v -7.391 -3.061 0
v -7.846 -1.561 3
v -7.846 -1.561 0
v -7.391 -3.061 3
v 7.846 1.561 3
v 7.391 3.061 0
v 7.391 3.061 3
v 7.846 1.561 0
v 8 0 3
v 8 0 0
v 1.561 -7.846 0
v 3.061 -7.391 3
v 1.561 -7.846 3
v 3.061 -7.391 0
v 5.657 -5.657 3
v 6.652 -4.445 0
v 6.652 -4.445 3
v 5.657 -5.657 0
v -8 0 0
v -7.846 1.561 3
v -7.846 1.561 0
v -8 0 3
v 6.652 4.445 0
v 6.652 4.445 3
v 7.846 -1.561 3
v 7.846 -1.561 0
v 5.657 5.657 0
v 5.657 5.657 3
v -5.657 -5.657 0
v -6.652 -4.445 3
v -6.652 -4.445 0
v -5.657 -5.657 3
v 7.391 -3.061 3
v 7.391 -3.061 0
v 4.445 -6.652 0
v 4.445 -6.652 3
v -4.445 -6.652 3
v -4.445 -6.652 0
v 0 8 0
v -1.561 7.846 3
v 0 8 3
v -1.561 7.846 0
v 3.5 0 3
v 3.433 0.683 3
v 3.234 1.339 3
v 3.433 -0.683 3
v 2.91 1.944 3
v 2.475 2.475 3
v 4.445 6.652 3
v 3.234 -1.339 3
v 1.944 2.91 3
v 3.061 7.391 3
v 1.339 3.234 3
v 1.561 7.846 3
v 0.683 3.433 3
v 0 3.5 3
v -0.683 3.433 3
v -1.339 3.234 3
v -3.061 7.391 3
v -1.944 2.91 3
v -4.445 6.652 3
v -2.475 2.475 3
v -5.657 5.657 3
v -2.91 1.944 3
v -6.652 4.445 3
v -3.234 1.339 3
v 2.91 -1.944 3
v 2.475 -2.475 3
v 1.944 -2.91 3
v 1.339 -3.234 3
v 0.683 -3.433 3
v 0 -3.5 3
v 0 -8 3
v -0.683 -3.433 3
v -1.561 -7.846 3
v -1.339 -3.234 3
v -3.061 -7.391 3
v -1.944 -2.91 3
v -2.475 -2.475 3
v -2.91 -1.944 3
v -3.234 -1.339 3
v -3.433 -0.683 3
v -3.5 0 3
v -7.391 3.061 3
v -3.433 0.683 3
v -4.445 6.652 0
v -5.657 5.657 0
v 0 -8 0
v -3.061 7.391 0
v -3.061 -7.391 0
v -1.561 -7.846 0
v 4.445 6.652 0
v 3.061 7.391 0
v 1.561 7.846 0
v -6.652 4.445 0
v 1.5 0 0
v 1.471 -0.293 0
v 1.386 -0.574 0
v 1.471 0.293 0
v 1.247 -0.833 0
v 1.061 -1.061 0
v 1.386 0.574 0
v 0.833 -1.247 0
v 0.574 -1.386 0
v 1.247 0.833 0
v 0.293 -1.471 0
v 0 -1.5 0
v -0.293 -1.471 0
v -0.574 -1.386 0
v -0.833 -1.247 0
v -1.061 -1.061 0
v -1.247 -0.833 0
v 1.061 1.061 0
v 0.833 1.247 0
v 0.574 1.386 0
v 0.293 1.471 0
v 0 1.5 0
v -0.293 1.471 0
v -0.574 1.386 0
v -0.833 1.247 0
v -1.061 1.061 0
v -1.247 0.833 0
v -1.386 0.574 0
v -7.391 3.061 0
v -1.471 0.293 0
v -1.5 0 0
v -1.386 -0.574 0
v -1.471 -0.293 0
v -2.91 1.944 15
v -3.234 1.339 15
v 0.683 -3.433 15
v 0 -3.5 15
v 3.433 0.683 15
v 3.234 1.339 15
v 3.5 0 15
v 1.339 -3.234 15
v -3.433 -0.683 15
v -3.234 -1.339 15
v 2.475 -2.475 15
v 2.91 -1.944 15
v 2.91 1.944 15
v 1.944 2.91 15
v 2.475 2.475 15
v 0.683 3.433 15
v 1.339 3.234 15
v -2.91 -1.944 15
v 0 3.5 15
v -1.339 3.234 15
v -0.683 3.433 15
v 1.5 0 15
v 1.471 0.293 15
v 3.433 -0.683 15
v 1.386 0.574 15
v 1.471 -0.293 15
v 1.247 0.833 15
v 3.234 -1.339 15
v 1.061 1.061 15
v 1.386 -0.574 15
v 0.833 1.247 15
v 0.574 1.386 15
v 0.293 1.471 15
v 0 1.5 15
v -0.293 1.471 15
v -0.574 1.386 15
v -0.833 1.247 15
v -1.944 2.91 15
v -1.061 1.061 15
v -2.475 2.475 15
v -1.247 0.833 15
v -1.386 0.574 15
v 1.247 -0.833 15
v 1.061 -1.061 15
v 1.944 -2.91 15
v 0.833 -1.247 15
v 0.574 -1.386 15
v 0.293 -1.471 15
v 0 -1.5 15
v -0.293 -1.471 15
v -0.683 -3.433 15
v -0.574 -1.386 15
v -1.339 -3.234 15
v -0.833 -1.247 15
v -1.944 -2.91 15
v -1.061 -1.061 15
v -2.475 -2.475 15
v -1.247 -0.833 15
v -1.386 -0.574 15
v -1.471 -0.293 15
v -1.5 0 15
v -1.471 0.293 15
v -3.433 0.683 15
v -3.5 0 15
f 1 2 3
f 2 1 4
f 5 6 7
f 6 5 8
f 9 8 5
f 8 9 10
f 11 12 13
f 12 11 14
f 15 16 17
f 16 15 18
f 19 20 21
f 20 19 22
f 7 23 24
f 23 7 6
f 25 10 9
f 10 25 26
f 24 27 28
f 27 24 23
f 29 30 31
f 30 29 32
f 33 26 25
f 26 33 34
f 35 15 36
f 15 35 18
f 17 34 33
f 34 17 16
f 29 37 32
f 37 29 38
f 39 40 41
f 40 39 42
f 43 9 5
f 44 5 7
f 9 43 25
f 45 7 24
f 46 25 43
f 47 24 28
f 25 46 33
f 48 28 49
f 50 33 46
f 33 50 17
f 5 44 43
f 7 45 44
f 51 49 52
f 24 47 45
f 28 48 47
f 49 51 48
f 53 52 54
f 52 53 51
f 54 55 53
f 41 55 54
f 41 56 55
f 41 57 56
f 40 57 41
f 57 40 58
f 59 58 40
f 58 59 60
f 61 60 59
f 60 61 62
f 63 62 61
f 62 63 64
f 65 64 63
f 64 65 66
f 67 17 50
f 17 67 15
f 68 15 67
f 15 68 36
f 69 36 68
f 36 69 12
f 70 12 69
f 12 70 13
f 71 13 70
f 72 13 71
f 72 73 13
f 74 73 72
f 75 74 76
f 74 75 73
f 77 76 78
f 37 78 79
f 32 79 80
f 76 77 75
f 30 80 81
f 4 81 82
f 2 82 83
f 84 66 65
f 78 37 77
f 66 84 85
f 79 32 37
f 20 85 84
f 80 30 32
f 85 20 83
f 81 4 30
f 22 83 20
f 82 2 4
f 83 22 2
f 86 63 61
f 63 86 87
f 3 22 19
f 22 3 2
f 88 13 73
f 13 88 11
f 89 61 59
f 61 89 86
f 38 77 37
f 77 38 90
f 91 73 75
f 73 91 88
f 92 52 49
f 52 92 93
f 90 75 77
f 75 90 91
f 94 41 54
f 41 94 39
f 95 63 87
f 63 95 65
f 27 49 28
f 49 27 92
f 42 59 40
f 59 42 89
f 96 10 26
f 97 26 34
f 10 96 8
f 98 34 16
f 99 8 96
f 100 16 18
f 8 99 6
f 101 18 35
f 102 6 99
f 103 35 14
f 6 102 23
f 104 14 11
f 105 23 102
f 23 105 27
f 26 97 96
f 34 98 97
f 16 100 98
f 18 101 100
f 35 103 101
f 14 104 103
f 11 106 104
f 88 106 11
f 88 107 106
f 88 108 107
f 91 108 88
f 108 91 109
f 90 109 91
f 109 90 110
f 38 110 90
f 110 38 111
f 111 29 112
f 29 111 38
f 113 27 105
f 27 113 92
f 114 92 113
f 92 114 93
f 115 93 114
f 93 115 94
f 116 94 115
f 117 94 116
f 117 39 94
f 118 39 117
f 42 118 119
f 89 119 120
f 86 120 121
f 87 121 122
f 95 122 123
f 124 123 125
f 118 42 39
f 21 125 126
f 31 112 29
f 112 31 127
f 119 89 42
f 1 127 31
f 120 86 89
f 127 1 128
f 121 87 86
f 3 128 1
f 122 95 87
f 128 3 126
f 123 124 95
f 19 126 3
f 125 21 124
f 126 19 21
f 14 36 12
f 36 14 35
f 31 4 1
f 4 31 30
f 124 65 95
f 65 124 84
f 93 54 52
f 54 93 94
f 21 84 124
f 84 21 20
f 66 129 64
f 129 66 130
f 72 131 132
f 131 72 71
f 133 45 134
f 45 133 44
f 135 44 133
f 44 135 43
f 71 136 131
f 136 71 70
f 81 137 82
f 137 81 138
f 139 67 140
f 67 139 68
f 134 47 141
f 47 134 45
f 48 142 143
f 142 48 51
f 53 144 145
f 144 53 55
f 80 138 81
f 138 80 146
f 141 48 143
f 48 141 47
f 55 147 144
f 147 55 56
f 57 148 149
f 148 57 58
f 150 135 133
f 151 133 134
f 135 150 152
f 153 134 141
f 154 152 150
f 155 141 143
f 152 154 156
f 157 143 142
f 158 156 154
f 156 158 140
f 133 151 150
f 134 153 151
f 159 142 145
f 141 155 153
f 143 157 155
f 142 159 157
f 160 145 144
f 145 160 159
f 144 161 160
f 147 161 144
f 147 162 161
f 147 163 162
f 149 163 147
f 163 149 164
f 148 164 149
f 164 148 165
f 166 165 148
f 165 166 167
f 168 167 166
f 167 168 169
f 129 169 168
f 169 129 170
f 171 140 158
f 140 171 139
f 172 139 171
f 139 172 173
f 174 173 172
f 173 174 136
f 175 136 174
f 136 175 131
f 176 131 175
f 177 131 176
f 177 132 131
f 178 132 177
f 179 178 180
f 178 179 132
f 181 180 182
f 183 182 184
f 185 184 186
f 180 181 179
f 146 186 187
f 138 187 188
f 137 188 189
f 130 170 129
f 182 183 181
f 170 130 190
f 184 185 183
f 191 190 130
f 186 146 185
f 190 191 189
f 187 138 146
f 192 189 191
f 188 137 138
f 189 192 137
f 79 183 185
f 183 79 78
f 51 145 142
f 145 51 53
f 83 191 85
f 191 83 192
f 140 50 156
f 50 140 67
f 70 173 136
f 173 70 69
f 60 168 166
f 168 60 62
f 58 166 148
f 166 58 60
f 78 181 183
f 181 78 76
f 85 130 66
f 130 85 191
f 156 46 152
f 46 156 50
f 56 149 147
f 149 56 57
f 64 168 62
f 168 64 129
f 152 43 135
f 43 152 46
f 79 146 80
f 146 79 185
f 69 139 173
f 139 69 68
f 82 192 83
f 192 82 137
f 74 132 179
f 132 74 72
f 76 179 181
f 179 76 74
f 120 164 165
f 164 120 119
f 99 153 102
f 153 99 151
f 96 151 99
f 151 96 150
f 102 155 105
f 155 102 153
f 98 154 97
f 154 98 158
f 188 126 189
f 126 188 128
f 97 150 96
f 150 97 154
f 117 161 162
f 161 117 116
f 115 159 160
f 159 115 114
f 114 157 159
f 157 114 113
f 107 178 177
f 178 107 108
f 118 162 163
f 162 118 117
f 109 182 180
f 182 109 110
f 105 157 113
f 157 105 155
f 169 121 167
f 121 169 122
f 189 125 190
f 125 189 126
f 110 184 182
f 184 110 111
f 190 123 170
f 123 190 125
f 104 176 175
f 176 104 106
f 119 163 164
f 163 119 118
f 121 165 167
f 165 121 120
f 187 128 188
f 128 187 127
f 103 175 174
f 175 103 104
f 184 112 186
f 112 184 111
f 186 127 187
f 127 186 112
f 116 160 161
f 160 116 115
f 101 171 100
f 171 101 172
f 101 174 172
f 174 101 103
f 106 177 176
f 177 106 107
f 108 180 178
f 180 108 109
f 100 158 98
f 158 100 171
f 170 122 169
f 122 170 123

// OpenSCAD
$fn = 32;

// ----------------------------------------------------------------------
// Micro post: flanged post, 5-20 mm class
// ----------------------------------------------------------------------

// --- parameters (mm) ---
post_d = 7;               // post diameter
post_h = 12;              // post height above the flange
flange_d = 16;            // flange diameter
flange_t = 3;             // flange thickness
bore_d = 3;               // through bore

total_h = post_h + flange_t;  // overall height

difference() {
  union() {
    cylinder(h = flange_t, d = flange_d);
    translate([0, 0, flange_t]) cylinder(h = post_h, d = post_d);
  }
  translate([0, 0, -1]) cylinder(h = total_h + 2, d = bore_d);
}
